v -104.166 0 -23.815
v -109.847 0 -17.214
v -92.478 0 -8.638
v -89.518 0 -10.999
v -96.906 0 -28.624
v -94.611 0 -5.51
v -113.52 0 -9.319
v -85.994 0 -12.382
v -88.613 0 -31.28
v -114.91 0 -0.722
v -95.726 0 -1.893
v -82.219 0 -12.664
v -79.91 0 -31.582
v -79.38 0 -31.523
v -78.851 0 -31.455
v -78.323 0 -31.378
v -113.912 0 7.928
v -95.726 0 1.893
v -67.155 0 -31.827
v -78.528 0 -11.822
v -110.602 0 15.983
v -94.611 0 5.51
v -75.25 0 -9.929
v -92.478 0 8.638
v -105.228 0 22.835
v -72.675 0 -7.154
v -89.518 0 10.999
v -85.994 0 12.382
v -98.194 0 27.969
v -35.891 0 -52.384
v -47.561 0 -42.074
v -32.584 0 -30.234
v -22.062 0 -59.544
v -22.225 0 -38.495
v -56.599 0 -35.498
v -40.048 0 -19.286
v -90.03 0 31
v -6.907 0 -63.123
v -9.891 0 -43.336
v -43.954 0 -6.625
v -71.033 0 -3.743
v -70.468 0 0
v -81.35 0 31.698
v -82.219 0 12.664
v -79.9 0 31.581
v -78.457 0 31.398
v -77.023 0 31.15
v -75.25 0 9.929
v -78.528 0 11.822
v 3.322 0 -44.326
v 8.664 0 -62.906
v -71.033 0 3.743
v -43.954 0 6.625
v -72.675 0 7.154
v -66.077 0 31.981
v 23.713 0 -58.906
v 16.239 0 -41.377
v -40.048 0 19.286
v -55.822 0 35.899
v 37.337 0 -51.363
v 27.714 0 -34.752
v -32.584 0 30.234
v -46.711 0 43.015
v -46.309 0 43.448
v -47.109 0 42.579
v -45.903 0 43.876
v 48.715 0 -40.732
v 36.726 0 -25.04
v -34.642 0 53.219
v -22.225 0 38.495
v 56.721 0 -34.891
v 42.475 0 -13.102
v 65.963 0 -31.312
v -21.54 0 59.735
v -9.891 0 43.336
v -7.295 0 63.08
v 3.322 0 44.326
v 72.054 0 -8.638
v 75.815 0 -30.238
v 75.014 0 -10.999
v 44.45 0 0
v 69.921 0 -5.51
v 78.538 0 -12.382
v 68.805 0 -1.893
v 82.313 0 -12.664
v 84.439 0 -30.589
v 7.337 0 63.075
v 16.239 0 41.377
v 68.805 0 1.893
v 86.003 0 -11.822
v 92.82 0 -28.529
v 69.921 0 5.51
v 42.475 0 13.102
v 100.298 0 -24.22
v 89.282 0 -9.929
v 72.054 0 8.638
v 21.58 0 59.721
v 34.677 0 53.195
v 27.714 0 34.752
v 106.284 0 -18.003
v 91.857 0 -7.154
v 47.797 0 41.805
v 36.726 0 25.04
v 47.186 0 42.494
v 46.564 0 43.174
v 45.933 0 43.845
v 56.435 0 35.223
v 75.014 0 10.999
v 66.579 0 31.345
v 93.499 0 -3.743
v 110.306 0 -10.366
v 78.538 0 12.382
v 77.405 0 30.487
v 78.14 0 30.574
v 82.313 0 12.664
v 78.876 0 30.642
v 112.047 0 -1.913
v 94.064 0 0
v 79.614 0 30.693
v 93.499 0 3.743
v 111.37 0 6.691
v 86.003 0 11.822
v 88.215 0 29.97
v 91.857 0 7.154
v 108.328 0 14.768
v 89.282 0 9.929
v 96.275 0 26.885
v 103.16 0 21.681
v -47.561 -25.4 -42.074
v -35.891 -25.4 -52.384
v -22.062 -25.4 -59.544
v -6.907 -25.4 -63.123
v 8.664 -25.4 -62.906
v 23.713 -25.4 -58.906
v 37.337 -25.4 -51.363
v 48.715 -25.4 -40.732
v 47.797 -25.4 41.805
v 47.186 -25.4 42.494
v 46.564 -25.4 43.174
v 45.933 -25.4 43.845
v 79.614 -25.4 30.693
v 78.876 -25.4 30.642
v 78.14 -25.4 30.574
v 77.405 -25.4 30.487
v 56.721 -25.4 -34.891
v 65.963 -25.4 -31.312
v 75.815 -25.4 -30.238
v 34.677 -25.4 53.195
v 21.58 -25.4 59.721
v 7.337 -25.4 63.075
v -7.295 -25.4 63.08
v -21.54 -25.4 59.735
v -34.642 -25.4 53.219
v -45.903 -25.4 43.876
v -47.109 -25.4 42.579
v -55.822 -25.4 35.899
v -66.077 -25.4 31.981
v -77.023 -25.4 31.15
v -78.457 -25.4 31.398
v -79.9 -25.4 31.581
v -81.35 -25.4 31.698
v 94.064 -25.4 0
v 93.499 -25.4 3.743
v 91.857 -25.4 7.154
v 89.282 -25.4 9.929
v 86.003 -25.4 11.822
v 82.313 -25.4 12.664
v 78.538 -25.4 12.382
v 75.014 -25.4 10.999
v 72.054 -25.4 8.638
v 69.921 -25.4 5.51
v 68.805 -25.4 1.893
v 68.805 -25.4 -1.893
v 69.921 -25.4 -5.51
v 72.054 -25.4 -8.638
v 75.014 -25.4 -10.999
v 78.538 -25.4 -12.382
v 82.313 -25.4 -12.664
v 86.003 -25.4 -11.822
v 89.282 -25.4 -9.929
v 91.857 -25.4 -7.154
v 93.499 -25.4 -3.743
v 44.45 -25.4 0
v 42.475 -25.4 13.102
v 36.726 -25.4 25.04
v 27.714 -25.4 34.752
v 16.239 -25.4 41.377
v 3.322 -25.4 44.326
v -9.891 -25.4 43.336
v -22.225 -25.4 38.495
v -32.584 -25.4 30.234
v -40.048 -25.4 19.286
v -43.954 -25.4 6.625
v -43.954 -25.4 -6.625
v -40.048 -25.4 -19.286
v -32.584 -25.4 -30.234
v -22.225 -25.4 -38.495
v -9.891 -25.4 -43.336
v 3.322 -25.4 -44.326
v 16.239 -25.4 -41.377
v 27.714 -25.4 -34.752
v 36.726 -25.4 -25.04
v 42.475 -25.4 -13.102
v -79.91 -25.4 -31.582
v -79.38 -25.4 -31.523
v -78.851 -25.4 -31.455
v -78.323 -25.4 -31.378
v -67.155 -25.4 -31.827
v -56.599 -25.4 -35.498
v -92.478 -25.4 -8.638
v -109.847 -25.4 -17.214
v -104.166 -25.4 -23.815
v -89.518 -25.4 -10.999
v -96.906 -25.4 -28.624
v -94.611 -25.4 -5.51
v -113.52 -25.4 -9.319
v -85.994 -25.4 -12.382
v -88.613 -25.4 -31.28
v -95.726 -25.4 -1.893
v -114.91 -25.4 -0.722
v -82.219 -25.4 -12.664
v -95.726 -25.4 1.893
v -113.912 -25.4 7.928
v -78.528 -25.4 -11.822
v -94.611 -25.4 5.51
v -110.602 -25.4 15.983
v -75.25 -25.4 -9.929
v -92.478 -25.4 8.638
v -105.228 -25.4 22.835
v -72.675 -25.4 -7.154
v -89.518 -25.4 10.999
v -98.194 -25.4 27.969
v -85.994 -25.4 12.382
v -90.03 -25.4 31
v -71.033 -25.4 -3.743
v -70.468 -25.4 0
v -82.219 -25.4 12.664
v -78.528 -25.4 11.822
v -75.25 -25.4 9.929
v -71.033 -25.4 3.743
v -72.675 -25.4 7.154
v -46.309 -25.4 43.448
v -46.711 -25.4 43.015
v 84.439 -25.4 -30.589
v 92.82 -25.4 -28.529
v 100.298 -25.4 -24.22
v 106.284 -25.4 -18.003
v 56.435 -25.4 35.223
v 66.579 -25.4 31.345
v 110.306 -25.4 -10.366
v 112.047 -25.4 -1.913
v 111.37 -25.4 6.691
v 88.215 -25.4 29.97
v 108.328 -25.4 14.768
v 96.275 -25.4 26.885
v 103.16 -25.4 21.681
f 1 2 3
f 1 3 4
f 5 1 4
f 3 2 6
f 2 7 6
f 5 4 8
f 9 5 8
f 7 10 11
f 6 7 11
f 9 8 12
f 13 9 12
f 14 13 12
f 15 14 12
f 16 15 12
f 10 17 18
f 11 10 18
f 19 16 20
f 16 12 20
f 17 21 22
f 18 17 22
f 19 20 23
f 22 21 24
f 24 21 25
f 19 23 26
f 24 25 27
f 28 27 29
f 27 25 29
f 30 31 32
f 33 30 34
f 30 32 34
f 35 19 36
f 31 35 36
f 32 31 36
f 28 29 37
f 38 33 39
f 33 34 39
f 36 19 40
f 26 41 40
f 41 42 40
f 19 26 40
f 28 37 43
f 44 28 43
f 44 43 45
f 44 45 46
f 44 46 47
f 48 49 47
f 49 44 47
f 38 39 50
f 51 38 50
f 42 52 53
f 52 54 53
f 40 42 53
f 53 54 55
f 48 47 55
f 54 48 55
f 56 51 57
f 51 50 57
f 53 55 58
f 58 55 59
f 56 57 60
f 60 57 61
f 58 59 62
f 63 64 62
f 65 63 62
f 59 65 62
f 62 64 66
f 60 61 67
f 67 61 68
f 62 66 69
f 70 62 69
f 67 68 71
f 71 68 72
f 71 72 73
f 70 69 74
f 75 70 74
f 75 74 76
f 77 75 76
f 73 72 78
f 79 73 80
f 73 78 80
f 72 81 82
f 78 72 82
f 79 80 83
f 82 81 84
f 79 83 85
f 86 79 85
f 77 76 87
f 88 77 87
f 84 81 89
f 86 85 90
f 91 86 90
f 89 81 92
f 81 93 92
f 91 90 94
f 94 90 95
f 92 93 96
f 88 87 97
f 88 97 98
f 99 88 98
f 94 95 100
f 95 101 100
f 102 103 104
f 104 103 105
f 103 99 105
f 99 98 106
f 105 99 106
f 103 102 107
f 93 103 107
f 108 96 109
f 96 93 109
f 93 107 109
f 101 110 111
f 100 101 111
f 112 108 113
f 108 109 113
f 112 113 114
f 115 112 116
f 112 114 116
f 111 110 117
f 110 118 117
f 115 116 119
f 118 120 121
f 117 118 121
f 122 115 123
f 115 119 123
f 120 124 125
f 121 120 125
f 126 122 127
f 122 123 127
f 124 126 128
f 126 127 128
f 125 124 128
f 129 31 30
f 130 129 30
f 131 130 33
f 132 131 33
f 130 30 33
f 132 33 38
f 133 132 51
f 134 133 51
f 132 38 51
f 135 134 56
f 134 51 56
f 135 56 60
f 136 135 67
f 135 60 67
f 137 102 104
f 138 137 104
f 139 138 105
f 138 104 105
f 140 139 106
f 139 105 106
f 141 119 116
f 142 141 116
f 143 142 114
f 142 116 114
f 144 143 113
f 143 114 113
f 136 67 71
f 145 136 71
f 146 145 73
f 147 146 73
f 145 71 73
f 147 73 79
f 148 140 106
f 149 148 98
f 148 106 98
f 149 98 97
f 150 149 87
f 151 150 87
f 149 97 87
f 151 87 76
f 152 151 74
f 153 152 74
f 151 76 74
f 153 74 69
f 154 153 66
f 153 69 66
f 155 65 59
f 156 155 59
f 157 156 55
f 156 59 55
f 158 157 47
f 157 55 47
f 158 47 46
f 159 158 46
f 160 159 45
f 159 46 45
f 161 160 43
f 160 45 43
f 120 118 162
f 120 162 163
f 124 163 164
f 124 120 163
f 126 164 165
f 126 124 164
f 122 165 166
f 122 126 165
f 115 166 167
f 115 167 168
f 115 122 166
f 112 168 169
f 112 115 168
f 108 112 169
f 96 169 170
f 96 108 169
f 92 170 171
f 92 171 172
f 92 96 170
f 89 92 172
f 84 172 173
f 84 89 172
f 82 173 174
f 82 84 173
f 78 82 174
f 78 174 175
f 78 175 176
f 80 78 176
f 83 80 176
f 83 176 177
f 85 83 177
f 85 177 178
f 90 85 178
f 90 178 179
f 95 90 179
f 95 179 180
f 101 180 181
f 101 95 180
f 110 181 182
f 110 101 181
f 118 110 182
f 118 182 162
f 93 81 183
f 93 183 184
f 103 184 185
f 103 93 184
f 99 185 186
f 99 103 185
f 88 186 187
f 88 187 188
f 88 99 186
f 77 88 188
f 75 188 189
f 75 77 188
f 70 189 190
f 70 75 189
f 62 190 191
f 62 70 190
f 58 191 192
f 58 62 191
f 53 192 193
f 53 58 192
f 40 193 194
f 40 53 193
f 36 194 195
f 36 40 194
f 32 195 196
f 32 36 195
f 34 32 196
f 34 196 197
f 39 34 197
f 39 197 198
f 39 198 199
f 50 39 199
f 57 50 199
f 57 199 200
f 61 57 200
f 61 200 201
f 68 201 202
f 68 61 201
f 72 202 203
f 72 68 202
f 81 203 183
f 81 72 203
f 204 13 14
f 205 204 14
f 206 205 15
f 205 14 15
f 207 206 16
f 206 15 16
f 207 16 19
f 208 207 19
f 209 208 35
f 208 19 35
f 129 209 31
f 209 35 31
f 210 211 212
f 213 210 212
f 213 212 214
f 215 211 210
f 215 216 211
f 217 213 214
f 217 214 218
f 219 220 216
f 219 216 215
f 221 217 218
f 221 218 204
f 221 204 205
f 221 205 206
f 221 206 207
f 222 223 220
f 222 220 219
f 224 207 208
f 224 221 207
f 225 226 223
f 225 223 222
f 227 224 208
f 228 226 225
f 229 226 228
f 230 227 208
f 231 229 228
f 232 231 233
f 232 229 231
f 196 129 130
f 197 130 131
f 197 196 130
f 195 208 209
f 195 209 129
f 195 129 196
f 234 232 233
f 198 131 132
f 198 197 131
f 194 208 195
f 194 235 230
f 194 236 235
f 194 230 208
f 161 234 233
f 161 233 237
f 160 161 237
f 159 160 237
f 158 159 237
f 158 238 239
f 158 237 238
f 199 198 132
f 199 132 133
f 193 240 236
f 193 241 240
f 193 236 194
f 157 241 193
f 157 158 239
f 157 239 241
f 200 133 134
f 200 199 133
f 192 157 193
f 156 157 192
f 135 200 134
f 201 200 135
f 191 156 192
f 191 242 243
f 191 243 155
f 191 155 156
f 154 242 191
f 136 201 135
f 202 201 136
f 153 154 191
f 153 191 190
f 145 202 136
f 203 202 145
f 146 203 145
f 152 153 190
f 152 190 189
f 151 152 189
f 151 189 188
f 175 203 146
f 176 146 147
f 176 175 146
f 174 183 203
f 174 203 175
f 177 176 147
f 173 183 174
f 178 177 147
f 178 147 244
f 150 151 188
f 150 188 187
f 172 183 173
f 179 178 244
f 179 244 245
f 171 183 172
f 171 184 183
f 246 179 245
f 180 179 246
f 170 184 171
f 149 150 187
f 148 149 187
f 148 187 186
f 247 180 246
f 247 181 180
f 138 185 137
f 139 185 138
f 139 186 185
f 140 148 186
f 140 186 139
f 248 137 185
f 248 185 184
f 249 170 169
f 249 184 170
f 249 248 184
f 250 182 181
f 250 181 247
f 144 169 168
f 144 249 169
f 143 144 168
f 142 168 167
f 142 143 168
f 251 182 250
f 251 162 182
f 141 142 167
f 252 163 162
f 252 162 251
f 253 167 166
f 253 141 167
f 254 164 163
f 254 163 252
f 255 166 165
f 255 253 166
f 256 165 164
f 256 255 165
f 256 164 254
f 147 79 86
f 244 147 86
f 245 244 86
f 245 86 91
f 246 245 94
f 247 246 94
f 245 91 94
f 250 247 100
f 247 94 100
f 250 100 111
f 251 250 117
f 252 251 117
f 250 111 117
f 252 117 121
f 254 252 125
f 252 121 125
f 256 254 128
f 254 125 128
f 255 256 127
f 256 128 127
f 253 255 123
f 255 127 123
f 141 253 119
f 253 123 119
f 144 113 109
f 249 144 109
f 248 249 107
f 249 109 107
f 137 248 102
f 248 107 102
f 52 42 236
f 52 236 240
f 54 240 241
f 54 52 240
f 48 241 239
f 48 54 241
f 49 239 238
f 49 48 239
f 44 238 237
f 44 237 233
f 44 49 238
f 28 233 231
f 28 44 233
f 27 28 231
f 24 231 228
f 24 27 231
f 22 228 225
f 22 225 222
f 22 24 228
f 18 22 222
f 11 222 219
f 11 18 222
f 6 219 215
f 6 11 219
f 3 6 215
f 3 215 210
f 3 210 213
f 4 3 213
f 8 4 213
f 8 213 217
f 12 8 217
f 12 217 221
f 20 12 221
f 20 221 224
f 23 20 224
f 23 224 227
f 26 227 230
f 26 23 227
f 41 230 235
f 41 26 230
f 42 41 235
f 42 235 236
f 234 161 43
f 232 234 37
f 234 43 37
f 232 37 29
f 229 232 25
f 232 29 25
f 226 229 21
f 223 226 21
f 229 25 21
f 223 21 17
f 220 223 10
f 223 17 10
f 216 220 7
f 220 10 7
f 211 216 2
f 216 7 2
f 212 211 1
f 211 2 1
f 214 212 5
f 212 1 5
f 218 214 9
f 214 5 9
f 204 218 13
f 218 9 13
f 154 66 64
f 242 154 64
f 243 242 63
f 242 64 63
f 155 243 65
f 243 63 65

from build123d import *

# Parameters (mm, degrees)
F0_R     = 12.7
F0_R_2   = 44.45
F1_DEPTH = 25.4


with BuildPart() as f1:
    # F0 (on Front) → F1 (new body)
    with BuildSketch(Plane.XZ):
        with BuildLine():
            ThreePointArc((-78.322921, -31.378096), (-61.741608, -33.273322), (-47.561115, -42.07363))
            ThreePointArc((-47.561115, -42.07363), (0.884923, -63.493834), (48.715187, -40.731813))
            ThreePointArc((48.715187, -40.731813), (61.225405, -32.799779), (75.815182, -30.23831))
            ThreePointArc((75.815182, -30.23831), (112.047103, -1.913109), (79.61425, 30.693318))
            ThreePointArc((79.61425, 30.693318), (78.511328, 30.574208), (77.405407, 30.487258))
            ThreePointArc((77.405407, 30.487258), (61.368574, 32.920927), (47.797419, 41.804985))
            ThreePointArc((47.797419, 41.804985), (46.84664, 42.808286), (45.932881, 43.845416))
            ThreePointArc((45.932881, 43.845416), (0.021282, 63.499996), (-45.903481, 43.876194))
            ThreePointArc((-45.903481, 43.876194), (-46.498842, 43.220557), (-47.109281, 42.578934))
            ThreePointArc((-47.109281, 42.578934), (-60.807213, 33.568892), (-77.023302, 31.149665))
            ThreePointArc((-77.023302, 31.149665), (-79.194575, 31.361818), (-81.350145, 31.6979))
            ThreePointArc((-81.350145, 31.6979), (-114.910072, -0.722366), (-79.91004, -31.582373))
            ThreePointArc((-79.91004, -31.582373), (-79.117553, -31.471901), (-78.322921, -31.378096))
        make_face()
        with Locations((-83.168291, 0)):
            Circle(F0_R, mode=Mode.SUBTRACT)
        Circle(F0_R_2, mode=Mode.SUBTRACT)
        with Locations((81.363559, 0)):
            Circle(F0_R, mode=Mode.SUBTRACT)
        with BuildLine():
            ThreePointArc((-79.91004, -31.582373), (-79.115193, -31.490235), (-78.322921, -31.378096))
            ThreePointArc((-78.322921, -31.378096), (-79.117553, -31.471901), (-79.91004, -31.582373))
        make_face()
        with BuildLine():
            ThreePointArc((77.405407, 30.487258), (78.511328, 30.574208), (79.61425, 30.693318))
            ThreePointArc((79.61425, 30.693318), (78.507969, 30.610219), (77.405407, 30.487258))
        make_face()
        with BuildLine():
            ThreePointArc((-77.023302, 31.149665), (-79.177299, 31.498166), (-81.350145, 31.6979))
            ThreePointArc((-81.350145, 31.6979), (-79.194575, 31.361818), (-77.023302, 31.149665))
        make_face()
        with BuildLine():
            ThreePointArc((45.932881, 43.845416), (46.84664, 42.808286), (47.797419, 41.804985))
            ThreePointArc((47.797419, 41.804985), (46.876253, 42.835346), (45.932881, 43.845416))
        make_face()
        with BuildLine():
            ThreePointArc((-45.903481, 43.876194), (-46.510904, 43.231768), (-47.109281, 42.578934))
            ThreePointArc((-47.109281, 42.578934), (-46.498842, 43.220557), (-45.903481, 43.876194))
        make_face()
    extrude(amount=F1_DEPTH)


solid = f1.part
